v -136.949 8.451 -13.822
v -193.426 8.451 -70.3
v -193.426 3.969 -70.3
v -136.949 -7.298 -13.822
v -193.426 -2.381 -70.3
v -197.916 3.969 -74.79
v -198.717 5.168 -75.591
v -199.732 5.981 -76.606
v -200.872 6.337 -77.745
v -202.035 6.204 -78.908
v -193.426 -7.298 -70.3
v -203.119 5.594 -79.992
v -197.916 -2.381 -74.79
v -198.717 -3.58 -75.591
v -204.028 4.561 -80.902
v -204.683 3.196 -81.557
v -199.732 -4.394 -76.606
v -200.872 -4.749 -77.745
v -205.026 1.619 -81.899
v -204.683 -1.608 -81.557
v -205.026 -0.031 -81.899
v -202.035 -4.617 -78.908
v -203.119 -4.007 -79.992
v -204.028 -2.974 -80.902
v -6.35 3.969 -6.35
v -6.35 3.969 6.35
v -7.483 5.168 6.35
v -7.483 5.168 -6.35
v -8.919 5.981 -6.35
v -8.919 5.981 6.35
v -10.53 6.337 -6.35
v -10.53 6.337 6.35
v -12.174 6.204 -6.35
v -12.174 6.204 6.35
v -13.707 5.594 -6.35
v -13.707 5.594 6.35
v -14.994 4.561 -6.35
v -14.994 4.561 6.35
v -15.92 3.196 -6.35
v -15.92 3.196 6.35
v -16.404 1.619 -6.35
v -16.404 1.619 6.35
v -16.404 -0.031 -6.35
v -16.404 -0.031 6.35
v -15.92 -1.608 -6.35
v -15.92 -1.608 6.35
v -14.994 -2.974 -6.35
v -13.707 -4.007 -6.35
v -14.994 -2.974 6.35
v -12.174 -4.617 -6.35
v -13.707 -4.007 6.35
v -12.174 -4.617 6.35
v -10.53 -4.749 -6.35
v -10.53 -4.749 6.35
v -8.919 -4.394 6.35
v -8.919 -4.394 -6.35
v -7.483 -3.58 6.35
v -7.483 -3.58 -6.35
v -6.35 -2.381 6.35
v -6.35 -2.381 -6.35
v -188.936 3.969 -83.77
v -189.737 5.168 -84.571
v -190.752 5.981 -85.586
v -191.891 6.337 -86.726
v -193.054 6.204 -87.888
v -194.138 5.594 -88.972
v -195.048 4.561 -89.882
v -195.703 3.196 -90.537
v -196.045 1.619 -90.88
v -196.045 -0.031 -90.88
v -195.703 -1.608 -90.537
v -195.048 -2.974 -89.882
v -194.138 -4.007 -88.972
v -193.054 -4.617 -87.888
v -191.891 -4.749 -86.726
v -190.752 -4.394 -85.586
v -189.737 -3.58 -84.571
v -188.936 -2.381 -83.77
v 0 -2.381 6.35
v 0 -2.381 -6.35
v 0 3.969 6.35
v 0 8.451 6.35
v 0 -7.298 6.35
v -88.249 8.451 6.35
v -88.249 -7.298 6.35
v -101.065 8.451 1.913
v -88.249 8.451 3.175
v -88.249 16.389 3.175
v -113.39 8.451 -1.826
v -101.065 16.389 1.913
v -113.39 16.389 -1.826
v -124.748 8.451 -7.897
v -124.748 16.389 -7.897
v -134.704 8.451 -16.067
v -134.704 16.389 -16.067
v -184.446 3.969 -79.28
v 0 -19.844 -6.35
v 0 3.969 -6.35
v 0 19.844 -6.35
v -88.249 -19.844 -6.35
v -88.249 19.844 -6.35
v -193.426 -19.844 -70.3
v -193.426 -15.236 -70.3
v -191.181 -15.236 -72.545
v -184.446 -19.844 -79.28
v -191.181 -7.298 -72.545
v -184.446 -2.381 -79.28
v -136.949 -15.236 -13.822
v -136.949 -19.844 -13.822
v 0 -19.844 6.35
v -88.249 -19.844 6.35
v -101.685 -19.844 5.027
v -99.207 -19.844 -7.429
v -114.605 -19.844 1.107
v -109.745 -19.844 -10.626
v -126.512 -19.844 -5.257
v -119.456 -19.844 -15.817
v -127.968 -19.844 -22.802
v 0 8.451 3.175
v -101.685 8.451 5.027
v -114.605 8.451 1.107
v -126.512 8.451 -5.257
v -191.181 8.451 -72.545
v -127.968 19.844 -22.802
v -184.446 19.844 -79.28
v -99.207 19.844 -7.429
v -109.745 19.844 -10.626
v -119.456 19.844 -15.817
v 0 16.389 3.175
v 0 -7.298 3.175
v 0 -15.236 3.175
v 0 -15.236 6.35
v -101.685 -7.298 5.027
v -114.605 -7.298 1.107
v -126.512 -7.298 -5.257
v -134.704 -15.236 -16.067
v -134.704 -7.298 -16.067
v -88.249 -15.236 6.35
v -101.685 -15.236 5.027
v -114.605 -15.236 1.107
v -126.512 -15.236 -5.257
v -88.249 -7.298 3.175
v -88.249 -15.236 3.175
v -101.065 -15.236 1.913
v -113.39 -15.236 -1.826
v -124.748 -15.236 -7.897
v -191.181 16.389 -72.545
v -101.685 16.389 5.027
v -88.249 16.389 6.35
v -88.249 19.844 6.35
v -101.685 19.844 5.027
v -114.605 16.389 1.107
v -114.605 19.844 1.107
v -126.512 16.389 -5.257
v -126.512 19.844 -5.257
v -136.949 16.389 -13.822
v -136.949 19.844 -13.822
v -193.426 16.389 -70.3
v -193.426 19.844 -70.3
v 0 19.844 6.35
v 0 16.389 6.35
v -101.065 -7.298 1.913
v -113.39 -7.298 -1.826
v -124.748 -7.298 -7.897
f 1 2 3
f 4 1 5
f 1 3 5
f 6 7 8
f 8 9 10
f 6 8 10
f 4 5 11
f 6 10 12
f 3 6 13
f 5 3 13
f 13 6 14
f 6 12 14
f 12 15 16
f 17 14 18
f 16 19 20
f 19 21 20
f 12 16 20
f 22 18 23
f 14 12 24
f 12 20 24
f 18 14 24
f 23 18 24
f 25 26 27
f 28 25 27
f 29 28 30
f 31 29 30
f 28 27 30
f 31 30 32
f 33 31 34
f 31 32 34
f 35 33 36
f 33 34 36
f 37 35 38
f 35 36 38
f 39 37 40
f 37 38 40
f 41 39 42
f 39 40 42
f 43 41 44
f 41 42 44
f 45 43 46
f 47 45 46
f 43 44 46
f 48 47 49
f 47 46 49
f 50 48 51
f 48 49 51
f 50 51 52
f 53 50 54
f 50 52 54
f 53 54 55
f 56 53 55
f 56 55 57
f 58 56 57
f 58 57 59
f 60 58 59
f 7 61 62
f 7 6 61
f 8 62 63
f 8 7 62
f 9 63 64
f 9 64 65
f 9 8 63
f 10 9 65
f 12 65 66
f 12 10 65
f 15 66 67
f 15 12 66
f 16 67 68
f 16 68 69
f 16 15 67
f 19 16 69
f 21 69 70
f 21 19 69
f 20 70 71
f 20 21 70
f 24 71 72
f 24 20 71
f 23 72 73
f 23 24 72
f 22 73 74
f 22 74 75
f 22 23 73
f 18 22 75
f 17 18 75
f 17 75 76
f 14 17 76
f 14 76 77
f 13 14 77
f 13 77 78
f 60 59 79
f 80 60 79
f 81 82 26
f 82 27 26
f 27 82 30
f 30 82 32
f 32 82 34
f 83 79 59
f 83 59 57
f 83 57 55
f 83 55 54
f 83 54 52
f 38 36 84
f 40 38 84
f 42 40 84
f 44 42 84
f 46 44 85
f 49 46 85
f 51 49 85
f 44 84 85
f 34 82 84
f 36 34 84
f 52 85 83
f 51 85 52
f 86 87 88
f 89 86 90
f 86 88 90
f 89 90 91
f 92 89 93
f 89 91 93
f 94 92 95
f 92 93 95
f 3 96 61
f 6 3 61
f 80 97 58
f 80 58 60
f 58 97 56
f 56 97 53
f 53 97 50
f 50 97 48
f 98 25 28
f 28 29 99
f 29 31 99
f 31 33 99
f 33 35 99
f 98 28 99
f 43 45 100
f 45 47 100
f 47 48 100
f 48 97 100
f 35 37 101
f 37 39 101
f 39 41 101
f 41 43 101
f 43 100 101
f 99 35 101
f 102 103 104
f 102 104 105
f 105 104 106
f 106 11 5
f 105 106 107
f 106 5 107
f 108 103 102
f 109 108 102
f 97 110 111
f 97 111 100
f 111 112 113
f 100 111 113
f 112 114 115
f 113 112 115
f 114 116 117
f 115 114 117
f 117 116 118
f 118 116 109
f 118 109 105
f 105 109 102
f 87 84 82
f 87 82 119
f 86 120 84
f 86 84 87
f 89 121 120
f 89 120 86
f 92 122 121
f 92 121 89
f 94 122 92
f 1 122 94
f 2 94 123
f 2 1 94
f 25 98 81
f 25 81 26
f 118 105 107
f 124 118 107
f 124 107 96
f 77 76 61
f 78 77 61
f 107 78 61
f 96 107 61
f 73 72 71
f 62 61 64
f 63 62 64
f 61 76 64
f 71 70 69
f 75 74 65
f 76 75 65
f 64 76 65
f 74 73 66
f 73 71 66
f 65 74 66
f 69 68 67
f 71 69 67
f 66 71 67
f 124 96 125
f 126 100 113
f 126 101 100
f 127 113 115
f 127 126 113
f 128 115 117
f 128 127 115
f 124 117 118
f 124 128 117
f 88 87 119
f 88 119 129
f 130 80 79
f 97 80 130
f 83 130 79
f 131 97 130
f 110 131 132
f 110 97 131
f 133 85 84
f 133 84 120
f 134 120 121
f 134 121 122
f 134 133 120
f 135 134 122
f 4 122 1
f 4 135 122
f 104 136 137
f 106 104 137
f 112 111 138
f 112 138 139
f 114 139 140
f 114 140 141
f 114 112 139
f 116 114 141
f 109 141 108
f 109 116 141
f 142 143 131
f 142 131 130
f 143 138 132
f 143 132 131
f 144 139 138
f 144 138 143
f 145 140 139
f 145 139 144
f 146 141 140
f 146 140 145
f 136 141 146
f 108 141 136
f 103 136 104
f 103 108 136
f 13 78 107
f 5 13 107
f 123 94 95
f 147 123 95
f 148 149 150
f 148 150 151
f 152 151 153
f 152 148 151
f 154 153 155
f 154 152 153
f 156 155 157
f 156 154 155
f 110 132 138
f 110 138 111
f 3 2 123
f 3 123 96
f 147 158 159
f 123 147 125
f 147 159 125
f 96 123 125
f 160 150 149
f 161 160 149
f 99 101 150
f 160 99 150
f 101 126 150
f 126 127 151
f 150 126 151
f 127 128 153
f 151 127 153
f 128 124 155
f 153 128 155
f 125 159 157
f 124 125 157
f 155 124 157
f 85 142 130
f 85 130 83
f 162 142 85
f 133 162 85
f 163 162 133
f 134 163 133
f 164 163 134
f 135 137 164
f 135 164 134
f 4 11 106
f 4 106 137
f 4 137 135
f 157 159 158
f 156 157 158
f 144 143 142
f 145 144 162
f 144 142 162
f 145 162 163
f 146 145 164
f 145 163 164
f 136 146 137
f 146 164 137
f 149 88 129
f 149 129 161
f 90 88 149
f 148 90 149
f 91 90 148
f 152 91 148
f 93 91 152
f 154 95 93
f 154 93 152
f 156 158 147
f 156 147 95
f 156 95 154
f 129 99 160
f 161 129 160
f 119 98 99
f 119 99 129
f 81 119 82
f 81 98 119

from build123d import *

# Parameters (mm, degrees)
F0_W     = 39.6875
F0_H     = 12.7
F4_DEPTH = 12.7
F8_DEPTH = 6.35
F9_W     = 7.9375
F9_H     = 3.175
F11_W    = 7.9375
F11_H    = 3.175


with BuildPart() as f2:
    # F2: sweep along a path in F1
    with BuildLine(Plane.XZ) as f2_path:
        Line((0, 0), (-88.24850028, 0))
        ThreePointArc((-88.24850028, 0), (-112.1747610939, -4.759229181), (-132.4584655909, -18.3123672238))
        Line((-132.4584655909, -18.3123672238), (-188.9358075988, -74.7897092318))
    # F0 (on Right) → F2 (sweep)
    with BuildSketch(Plane.YZ):
        Rectangle(F0_W, F0_H)
    sweep(path=f2_path.line)

    # F3 (on Top) → F4 (cut, symmetric)
    with BuildSketch(Plane.XY):
        with BuildLine():
            Line((-6.35, -2.38125), (0, -2.38125))
            Line((0, -2.38125), (0, 3.96875))
            Line((0, 3.96875), (-6.35, 3.96875))
            ThreePointArc((-6.35, 3.96875), (-16.4659966007, 0.79375), (-6.35, -2.38125))
        make_face()
    extrude(amount=F4_DEPTH, both=True, mode=Mode.SUBTRACT)

    # F7 (on plane+point) → F8 (join, symmetric)
    with BuildSketch(Plane(origin=(-57.0730491835, 0, 57.0730491835), x_dir=(0, -1, 0), z_dir=(-0.7071067812, 0, 0.7071067812))):
        with BuildLine():
            Line((2.38125, -192.8321013228), (2.38125, -186.4821013228))
            Line((2.38125, -186.4821013228), (-3.96875, -186.4821013228))
            Line((-3.96875, -186.4821013228), (-3.96875, -192.8321013228))
            ThreePointArc((-3.96875, -192.8321013228), (-0.79375, -202.9480979235), (2.38125, -192.8321013228))
        make_face()
    extrude(amount=F8_DEPTH, both=True)

    # F10: sweep along a path in F1
    with BuildLine(Plane.XZ) as f10_path:
        Line((0, 0), (-88.24850028, 0))
        ThreePointArc((-88.24850028, 0), (-112.1747610939, -4.759229181), (-132.4584655909, -18.3123672238))
        Line((-132.4584655909, -18.3123672238), (-188.9358075988, -74.7897092318))
    # F9 (on face) → F10 (sweep, cut)
    with BuildSketch(Plane.YZ):
        with Locations((12.4199826866, 4.7625)):
            Rectangle(F9_W, F9_H)
    sweep(path=f10_path.line, mode=Mode.SUBTRACT)

    # F12: sweep along a path in F1
    with BuildLine(Plane.XZ) as f12_path:
        Line((0, 0), (-88.24850028, 0))
        ThreePointArc((-88.24850028, 0), (-112.1747610939, -4.759229181), (-132.4584655909, -18.3123672238))
        Line((-132.4584655909, -18.3123672238), (-188.9358075988, -74.7897092318))
    # F11 (on face) → F12 (sweep, cut)
    with BuildSketch(Plane.YZ):
        with Locations((-11.2668295726, 4.7625)):
            Rectangle(F11_W, F11_H)
    sweep(path=f12_path.line, mode=Mode.SUBTRACT)


solid = f2.part
